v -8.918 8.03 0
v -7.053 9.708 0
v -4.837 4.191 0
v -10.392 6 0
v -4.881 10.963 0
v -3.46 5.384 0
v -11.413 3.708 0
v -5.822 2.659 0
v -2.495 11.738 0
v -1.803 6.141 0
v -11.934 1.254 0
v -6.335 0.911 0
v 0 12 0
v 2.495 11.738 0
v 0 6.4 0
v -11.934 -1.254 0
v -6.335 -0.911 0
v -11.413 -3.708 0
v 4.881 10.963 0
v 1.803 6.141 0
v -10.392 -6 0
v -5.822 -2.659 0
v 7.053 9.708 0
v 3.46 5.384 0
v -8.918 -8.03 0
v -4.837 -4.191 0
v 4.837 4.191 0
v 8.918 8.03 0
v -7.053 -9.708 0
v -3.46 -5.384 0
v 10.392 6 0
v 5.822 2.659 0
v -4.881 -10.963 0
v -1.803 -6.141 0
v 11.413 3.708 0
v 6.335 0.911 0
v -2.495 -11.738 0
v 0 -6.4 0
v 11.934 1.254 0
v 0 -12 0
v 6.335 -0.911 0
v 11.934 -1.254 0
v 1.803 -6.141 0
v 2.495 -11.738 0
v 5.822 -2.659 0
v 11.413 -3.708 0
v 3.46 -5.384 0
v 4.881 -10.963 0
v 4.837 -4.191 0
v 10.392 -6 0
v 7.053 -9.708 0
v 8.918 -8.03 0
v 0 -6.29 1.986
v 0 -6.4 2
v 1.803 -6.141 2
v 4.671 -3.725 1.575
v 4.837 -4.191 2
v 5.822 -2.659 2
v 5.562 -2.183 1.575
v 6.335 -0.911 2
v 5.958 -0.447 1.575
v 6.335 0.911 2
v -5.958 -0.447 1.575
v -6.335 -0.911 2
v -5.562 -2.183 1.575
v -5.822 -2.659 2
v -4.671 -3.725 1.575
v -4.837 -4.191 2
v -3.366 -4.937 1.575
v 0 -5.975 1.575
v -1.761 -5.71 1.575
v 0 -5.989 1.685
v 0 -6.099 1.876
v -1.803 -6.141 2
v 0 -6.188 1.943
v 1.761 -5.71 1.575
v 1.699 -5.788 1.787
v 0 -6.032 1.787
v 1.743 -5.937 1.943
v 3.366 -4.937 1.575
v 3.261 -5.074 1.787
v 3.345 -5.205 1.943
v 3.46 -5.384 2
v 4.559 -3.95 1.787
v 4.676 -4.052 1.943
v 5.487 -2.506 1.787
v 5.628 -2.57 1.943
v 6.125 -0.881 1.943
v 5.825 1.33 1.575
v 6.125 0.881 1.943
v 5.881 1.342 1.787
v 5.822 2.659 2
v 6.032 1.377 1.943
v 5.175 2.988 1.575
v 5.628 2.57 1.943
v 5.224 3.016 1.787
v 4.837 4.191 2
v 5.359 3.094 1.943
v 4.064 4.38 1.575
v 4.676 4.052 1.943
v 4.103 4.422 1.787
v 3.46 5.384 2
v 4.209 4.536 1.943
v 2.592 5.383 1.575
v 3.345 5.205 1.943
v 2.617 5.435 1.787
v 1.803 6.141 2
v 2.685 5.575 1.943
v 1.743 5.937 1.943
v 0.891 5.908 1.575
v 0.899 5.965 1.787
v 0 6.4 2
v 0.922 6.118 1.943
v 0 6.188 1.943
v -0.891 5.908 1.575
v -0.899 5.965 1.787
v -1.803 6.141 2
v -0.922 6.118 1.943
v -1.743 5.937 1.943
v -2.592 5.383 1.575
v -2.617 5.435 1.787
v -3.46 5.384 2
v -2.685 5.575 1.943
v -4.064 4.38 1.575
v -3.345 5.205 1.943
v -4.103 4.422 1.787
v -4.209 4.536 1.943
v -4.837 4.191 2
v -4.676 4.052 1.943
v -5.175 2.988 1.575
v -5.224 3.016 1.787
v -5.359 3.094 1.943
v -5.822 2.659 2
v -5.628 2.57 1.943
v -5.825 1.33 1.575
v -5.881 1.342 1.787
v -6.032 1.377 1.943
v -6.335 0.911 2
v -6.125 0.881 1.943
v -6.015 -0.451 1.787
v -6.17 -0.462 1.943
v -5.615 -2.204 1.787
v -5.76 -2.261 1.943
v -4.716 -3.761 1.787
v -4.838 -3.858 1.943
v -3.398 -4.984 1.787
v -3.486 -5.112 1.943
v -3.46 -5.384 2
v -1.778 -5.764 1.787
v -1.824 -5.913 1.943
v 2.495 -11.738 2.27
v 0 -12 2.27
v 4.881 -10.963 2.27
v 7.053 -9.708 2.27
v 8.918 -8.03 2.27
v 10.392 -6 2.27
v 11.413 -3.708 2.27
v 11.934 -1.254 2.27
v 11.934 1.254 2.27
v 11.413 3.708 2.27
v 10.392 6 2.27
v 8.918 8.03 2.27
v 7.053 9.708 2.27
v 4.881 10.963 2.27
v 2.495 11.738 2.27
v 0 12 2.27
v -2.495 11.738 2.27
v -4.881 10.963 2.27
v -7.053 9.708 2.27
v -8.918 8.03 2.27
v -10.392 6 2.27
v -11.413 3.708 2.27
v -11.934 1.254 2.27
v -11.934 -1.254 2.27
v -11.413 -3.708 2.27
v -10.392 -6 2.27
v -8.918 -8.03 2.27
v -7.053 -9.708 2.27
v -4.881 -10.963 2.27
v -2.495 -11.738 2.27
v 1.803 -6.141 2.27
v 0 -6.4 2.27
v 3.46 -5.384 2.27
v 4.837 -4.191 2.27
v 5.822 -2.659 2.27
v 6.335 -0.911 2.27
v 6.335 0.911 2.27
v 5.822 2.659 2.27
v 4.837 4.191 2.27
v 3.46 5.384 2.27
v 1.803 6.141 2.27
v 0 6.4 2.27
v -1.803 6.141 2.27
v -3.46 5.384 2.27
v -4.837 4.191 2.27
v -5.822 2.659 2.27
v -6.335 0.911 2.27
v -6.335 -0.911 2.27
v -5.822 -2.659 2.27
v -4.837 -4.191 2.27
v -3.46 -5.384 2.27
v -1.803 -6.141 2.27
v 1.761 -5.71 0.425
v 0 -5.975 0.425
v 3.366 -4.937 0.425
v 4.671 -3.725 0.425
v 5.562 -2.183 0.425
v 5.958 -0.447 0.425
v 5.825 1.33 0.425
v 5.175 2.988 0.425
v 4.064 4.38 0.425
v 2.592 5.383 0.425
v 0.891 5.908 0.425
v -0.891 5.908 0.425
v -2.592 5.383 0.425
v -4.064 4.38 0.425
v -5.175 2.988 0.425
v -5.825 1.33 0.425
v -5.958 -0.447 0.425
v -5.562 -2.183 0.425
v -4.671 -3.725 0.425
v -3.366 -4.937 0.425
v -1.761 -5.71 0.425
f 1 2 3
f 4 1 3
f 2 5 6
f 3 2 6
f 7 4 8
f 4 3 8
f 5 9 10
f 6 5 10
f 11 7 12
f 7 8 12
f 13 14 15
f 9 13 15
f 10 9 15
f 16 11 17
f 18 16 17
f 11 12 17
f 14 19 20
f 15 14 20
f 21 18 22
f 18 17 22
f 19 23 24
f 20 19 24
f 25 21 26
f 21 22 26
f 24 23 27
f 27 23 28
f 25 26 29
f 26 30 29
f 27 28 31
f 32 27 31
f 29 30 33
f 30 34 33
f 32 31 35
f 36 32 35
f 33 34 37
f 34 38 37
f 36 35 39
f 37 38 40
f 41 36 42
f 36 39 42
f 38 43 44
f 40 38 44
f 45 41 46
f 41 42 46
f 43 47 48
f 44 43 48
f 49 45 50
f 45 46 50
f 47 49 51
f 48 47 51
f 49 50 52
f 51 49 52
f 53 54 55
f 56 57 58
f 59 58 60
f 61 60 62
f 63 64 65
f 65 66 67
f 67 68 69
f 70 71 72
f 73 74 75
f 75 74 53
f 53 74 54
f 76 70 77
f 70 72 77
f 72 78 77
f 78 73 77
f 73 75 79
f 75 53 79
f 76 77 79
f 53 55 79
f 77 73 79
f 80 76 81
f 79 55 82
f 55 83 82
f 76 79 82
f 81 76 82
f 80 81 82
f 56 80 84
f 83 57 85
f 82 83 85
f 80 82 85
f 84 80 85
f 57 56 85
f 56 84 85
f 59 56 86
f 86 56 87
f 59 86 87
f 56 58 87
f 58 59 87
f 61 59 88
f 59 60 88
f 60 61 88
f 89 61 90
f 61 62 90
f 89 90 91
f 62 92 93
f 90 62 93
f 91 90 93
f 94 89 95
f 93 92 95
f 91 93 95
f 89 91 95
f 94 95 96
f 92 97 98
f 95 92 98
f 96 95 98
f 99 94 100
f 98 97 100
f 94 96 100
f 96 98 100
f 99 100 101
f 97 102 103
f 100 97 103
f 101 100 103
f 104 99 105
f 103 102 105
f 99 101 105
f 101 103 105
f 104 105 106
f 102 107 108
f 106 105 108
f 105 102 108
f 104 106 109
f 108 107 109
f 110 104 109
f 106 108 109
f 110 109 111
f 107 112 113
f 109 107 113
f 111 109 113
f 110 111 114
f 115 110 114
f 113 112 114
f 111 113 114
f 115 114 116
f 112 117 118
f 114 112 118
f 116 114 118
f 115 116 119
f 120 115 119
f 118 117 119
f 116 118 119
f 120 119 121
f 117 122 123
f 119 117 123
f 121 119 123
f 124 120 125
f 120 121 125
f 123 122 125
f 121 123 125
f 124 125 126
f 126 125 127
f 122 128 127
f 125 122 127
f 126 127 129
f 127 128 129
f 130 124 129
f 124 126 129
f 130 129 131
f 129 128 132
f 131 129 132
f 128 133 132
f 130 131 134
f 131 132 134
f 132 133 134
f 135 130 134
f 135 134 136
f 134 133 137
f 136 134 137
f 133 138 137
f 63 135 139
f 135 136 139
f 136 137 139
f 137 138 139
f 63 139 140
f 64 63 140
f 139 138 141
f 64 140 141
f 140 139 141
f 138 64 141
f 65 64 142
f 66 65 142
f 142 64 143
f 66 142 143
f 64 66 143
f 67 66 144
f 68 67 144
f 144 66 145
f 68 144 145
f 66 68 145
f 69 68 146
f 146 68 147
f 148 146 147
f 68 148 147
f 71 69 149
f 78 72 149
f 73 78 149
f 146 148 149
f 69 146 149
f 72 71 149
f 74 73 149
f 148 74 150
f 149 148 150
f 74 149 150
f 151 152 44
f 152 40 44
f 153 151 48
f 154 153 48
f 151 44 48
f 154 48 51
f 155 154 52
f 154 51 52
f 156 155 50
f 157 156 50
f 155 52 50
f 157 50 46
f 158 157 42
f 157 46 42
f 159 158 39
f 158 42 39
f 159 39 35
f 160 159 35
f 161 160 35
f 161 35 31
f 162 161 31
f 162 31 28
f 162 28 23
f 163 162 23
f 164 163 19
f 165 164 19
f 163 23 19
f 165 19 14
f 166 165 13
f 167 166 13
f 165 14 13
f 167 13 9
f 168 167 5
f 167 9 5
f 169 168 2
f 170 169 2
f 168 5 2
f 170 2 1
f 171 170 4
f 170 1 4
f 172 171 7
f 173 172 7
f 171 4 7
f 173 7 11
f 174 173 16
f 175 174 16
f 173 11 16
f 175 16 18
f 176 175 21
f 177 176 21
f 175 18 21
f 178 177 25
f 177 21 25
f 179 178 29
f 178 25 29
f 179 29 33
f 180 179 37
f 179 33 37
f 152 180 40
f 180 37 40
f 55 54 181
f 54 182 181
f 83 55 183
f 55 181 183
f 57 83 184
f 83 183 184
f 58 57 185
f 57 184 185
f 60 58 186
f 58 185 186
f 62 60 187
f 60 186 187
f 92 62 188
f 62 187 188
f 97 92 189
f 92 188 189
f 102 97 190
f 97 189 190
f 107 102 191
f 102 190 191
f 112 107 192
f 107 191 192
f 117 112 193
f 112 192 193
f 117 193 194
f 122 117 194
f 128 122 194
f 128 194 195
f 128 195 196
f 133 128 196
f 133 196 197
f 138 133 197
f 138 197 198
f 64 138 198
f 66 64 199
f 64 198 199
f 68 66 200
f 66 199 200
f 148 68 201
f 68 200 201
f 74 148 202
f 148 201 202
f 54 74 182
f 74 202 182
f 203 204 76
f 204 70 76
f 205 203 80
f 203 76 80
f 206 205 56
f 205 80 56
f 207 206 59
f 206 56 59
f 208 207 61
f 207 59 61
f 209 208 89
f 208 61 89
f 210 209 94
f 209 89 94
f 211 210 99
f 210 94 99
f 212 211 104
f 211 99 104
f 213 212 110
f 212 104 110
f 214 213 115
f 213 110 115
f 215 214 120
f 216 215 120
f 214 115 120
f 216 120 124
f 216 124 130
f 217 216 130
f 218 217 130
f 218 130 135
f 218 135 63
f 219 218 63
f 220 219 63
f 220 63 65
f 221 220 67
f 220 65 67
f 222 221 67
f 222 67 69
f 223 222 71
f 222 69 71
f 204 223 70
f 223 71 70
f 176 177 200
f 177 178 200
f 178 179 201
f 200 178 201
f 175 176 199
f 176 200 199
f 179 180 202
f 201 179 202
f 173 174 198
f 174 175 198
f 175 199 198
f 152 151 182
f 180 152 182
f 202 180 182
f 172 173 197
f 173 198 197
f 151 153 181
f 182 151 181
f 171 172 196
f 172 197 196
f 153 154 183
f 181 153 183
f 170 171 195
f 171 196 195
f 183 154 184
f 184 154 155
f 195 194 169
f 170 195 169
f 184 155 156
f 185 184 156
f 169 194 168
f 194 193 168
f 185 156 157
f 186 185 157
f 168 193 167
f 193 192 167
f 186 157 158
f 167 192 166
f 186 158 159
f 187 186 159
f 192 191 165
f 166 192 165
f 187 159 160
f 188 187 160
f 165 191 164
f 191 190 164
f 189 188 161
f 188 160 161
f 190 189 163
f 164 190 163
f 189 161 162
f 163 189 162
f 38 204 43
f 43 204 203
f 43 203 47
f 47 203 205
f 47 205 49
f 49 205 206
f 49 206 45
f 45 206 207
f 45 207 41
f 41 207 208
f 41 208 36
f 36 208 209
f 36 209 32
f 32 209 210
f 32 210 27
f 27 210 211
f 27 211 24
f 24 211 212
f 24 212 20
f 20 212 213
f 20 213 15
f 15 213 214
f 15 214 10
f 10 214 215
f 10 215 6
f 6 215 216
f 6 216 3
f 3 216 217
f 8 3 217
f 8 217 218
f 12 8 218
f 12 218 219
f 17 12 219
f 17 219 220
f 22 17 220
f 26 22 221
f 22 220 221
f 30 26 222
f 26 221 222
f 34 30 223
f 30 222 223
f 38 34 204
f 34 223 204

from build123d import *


with BuildPart() as f1:
    # F0 (on Right) → F1 (revolve)
    with BuildSketch(Plane.YZ):
        Polygon((-12, 0), (-6.4, 0), (-6.4, 2), (-6.4, 2.2704), (-12, 2.2704), align=None)
        with BuildLine():
            Line((-6.4, 2), (-6.4, 0))
            Line((-6.4, 0), (-5.975, 0.425))
            Line((-5.975, 0.425), (-5.975, 1.575))
            ThreePointArc((-5.975, 1.575), (-6.09948, 1.87552), (-6.4, 2))
        make_face()
    revolve(axis=Axis((0, 0, 18.057704), (0, 0, 1)))


solid = f1.part
